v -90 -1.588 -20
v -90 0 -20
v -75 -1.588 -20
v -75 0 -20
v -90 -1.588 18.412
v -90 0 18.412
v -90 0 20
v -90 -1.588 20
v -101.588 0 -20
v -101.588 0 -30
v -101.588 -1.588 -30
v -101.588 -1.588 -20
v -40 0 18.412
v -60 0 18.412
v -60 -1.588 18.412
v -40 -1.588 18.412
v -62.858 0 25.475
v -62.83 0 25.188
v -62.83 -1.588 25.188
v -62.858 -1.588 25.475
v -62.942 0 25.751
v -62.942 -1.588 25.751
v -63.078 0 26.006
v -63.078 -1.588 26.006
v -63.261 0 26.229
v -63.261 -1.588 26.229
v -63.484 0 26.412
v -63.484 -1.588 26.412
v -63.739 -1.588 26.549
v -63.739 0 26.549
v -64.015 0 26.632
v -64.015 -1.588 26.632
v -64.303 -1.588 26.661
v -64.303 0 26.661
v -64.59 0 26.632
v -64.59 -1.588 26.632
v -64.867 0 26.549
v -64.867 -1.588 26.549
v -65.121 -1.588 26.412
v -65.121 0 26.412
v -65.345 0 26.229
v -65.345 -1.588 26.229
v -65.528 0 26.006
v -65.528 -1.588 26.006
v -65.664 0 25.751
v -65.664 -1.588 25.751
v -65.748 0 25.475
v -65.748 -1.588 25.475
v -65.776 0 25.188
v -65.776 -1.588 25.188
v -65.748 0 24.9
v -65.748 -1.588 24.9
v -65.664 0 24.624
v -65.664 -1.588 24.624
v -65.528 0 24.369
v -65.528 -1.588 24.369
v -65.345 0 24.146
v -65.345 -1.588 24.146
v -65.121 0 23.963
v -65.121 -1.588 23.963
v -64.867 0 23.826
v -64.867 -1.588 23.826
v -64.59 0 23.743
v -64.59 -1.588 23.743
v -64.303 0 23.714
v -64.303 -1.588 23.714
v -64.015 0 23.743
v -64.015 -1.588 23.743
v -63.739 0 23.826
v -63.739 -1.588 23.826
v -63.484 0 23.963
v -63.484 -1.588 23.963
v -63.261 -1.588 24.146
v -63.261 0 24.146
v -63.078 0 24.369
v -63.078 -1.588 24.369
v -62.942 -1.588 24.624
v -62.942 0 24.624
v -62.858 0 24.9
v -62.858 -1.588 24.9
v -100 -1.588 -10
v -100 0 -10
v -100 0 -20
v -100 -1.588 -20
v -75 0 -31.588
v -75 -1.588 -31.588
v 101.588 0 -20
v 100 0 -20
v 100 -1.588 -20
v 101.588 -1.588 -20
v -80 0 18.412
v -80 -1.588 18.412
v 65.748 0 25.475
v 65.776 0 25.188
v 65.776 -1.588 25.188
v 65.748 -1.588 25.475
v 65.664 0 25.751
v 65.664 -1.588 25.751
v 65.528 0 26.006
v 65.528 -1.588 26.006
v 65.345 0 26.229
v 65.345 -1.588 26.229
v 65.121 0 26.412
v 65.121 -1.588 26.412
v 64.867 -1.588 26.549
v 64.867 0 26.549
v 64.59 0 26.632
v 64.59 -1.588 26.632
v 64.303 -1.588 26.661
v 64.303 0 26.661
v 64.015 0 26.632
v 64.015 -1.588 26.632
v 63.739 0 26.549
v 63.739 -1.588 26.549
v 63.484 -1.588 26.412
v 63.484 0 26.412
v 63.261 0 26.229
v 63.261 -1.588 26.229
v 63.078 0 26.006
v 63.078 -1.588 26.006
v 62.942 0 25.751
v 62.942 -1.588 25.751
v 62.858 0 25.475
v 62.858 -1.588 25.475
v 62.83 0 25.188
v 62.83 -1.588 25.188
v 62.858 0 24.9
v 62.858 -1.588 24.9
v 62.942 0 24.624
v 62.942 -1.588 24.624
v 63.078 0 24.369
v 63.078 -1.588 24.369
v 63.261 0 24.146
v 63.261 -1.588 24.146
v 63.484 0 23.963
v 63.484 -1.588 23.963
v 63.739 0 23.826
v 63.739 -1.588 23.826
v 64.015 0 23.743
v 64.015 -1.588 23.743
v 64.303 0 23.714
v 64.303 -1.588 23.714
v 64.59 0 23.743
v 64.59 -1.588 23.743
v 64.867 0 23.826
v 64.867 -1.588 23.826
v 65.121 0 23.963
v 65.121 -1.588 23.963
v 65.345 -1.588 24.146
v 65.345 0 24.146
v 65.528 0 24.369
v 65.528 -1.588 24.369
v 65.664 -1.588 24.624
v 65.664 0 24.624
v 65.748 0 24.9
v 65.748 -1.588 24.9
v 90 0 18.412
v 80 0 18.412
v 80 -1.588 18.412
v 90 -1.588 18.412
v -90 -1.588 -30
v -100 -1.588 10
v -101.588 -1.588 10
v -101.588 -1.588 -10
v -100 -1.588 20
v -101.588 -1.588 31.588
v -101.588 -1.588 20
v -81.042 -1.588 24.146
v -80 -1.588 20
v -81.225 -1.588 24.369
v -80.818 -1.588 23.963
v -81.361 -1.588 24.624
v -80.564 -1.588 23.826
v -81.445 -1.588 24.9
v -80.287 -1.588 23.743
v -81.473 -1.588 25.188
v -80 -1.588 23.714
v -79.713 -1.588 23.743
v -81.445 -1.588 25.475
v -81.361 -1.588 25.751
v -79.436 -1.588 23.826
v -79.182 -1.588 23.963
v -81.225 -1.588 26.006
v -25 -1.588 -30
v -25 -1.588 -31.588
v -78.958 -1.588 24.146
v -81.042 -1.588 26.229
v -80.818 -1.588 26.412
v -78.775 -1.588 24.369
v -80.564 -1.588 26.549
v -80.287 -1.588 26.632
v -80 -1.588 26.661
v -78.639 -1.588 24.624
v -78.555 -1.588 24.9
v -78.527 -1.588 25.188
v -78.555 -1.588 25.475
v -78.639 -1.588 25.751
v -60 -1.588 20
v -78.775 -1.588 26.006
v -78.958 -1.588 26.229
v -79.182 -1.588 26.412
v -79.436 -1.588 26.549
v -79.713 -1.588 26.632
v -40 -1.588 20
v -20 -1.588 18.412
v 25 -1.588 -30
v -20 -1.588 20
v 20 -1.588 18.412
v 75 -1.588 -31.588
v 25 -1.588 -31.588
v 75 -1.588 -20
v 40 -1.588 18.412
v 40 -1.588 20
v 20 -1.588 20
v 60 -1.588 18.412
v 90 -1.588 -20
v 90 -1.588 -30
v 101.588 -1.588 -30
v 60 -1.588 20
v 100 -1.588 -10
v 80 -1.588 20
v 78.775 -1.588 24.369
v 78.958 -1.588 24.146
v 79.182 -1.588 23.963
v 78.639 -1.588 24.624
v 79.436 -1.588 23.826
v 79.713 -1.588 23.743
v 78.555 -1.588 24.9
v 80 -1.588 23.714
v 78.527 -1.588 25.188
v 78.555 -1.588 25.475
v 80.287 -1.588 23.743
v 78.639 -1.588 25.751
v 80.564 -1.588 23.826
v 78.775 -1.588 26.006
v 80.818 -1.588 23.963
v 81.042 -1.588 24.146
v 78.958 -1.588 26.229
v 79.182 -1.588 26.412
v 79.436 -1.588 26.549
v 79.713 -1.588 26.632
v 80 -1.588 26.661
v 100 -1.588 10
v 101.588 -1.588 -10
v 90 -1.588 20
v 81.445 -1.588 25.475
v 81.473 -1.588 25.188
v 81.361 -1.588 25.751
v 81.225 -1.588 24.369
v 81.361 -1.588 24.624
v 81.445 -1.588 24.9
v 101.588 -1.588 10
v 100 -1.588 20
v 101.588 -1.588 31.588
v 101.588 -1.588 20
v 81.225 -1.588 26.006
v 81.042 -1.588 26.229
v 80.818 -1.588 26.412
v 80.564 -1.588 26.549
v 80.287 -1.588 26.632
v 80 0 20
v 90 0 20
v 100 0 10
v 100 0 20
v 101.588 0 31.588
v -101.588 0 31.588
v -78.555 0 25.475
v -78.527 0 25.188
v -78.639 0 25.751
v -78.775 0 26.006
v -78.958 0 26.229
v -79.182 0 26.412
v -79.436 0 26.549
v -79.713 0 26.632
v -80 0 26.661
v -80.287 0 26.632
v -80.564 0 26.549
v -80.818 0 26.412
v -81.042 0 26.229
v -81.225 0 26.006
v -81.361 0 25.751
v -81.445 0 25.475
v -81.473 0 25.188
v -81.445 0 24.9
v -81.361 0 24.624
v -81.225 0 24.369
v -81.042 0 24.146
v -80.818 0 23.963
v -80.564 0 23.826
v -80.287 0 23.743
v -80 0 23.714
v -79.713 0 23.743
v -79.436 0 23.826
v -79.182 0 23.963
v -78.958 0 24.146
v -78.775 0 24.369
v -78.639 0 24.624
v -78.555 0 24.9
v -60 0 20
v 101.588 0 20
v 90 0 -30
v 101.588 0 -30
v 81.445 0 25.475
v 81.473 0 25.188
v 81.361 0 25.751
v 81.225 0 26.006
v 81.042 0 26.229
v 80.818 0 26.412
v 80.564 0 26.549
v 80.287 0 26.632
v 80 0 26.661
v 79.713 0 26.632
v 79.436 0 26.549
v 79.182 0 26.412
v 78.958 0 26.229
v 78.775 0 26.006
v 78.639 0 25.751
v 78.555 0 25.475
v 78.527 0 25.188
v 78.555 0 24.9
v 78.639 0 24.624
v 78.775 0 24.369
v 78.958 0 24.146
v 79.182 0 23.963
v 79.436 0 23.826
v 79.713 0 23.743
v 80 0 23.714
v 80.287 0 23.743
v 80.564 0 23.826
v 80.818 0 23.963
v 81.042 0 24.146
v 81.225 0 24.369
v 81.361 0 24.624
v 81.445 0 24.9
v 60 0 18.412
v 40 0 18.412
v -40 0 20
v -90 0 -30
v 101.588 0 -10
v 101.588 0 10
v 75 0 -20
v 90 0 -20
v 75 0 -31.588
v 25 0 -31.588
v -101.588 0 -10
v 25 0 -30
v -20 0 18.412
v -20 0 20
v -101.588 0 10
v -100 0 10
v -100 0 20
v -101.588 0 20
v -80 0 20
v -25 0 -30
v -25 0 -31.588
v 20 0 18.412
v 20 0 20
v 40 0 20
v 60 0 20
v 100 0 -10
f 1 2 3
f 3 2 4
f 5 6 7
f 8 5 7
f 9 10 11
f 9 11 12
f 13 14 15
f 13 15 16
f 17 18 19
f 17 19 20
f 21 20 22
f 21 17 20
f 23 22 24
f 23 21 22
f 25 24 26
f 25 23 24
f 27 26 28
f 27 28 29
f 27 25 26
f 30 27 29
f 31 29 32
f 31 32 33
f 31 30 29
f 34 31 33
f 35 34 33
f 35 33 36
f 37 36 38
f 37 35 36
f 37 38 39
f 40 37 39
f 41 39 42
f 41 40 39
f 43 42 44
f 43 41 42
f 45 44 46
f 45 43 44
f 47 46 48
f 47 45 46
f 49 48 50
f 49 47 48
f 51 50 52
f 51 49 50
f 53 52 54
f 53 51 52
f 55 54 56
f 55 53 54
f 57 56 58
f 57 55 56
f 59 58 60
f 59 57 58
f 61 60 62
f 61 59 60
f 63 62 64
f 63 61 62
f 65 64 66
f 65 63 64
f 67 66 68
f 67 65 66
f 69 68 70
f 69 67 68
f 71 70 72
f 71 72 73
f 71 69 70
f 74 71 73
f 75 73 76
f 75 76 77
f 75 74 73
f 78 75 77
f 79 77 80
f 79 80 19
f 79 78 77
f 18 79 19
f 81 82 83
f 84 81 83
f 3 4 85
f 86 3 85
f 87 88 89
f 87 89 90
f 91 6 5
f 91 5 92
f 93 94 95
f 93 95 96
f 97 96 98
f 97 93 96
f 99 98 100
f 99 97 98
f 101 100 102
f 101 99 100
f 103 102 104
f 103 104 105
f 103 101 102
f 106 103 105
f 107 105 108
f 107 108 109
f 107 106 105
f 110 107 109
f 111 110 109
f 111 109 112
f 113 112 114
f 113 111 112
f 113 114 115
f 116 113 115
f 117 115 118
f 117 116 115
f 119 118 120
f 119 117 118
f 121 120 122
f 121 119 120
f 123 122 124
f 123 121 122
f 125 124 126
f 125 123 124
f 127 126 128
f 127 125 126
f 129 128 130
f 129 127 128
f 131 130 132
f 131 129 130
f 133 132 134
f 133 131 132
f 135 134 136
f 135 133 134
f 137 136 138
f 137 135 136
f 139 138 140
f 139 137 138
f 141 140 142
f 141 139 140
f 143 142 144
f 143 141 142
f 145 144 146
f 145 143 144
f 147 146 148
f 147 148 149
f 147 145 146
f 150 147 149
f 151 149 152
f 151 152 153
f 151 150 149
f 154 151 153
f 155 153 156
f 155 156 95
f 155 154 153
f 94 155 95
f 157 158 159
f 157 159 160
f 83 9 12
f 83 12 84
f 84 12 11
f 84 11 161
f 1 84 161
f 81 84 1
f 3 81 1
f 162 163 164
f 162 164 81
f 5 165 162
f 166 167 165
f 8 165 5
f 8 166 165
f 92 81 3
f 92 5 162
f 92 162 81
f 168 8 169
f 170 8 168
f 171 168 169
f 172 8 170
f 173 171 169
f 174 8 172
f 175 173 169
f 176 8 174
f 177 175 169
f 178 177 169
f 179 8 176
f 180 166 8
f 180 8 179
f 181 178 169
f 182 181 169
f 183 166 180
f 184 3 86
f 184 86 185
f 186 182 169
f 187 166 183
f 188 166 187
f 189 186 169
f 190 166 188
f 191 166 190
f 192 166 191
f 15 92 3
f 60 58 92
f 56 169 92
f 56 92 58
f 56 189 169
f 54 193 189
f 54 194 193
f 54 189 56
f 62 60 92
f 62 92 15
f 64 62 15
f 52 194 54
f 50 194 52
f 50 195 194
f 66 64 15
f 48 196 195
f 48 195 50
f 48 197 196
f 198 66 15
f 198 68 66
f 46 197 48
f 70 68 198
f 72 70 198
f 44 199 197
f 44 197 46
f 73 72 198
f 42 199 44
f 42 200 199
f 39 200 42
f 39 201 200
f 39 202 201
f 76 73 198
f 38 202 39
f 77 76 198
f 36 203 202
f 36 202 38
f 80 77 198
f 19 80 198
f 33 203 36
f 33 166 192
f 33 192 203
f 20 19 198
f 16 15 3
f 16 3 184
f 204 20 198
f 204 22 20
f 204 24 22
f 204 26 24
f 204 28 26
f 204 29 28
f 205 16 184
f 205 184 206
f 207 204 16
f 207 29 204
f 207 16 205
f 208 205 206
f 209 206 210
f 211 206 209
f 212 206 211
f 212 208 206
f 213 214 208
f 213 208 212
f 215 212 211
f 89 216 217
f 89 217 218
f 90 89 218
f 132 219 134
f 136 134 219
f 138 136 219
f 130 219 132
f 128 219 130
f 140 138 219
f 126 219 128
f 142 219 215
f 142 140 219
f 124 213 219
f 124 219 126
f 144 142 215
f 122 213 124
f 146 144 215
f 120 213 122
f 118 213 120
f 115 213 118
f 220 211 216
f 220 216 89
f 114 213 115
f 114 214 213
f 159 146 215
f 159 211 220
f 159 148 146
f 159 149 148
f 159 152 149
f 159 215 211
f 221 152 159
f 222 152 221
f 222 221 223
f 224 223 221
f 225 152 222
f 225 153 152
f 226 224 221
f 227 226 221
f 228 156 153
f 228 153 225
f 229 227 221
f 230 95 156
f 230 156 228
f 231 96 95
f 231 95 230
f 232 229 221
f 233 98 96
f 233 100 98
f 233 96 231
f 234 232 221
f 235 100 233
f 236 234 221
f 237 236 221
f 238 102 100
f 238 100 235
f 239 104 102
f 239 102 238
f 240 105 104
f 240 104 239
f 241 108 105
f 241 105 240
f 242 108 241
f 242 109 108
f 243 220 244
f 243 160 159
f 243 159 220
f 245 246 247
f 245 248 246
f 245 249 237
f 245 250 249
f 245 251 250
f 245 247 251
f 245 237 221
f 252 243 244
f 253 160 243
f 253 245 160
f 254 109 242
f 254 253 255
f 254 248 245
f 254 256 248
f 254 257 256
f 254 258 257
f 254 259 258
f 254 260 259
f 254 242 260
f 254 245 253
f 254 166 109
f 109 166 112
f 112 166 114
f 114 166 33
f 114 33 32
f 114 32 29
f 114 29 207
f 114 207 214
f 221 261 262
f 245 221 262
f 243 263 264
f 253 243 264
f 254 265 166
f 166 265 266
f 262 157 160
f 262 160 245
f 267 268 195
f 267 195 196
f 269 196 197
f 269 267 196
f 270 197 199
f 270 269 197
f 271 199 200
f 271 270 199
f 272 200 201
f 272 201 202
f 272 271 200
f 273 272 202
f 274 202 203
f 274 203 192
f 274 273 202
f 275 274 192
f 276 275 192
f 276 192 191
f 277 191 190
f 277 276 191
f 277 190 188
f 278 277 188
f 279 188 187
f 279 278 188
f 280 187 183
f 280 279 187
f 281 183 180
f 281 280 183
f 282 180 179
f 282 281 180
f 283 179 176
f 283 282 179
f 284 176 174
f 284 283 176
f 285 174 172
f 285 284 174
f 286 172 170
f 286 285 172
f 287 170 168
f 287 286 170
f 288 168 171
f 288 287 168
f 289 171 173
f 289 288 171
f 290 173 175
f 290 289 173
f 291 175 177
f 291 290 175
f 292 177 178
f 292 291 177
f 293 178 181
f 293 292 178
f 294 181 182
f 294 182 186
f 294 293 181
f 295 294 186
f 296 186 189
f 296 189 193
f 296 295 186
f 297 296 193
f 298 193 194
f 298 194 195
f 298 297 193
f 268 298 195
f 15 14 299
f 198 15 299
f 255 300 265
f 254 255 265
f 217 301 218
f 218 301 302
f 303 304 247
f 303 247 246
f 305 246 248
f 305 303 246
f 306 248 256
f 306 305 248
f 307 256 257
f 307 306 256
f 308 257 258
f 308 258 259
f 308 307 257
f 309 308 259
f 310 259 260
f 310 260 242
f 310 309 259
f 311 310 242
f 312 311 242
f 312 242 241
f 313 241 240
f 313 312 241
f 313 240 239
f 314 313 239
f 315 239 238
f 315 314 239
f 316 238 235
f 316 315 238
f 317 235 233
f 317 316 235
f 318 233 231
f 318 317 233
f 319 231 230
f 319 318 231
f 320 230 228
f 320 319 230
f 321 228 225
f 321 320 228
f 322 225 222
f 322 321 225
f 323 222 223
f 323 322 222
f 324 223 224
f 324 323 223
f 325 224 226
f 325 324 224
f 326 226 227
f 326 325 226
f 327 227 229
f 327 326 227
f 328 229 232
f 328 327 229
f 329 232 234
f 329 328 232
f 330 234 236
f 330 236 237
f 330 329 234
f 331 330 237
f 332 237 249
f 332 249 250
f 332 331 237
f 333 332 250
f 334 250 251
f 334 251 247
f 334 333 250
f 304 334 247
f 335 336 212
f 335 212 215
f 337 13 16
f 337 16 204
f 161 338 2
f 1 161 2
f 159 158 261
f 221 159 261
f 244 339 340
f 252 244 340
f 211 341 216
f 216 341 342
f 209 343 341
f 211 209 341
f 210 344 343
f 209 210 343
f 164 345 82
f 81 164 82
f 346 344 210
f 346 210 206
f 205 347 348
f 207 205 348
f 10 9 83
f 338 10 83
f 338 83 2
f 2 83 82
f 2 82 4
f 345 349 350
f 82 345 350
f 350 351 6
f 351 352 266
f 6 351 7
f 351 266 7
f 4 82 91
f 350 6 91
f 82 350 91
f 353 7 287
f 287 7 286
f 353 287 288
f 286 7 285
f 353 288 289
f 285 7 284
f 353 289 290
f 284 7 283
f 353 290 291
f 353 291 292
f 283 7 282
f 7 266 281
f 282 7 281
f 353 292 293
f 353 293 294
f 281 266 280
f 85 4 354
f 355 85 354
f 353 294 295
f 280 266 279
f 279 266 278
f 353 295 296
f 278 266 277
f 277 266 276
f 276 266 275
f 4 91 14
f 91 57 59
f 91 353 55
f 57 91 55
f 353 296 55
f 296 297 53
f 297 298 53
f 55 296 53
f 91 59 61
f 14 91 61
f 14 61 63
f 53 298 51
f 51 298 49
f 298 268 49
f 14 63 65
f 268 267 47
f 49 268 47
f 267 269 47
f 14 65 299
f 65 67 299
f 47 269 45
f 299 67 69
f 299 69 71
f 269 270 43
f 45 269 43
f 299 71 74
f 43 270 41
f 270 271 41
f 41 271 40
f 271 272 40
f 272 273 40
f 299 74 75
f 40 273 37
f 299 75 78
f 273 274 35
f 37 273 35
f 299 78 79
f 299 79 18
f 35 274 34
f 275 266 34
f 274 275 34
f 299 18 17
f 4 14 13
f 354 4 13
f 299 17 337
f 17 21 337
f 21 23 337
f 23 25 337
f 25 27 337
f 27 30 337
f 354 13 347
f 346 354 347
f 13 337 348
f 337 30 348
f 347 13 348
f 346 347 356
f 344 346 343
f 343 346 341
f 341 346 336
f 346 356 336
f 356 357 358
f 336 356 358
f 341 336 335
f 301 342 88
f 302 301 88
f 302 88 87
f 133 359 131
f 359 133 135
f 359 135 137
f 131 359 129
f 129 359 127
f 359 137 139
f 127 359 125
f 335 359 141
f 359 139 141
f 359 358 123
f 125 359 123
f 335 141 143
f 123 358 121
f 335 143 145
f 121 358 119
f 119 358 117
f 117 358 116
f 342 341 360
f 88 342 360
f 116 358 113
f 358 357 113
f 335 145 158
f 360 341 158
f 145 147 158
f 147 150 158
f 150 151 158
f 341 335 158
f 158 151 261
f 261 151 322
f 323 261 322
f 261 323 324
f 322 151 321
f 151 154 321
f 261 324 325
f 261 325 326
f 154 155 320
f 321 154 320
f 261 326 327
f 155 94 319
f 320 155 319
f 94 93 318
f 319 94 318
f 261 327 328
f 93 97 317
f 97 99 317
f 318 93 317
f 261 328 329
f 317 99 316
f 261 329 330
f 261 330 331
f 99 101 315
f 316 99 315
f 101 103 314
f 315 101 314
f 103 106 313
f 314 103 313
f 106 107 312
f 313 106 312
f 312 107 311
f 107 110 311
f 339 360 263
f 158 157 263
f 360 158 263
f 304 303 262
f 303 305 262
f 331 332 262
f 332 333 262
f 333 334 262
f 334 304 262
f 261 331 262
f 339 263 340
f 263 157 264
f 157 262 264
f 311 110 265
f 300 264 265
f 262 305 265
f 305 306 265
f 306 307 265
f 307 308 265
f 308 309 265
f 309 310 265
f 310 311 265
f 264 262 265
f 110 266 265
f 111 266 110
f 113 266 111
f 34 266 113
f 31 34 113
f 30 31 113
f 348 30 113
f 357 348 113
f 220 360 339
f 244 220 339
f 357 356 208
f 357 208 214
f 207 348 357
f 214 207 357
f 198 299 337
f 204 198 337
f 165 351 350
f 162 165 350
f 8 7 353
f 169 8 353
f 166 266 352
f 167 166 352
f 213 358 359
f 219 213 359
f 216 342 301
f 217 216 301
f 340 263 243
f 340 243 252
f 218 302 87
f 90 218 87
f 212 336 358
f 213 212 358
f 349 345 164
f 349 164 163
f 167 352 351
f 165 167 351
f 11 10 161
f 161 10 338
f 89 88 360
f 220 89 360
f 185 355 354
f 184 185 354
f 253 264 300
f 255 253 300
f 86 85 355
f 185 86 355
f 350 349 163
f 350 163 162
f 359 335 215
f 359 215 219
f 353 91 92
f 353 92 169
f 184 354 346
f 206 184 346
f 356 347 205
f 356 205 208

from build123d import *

# Parameters (mm, degrees)
F0_W     = 50
F0_H     = 1.5875
F0_W_2   = 1.5875
F0_H_2   = 20
F0_H_3   = 10
F0_W_3   = 10
F0_R     = 1.4732
F0_W_4   = 20
F0_W_5   = 40
F1_DEPTH = 1.5875


# Not quite as in the source:
# - a length typed as a fraction of an inch, garbled in the dataset ("3 / 203.2 mm" for 3/8 in), is restored


with BuildPart() as f1:
    # F0 (on Front) → F1 (new body)
    with BuildSketch(Plane.XZ):
        with Locations((50, -30.79375)):
            Rectangle(F0_W, F0_H)
        with Locations((-50, -30.79375)):
            Rectangle(F0_W, F0_H)
        with Locations((100.79375, 0)):
            Rectangle(F0_W_2, F0_H_2)
        with Locations((100.79375, -25)):
            Rectangle(F0_W_2, F0_H_3)
        with Locations((-100.79375, 0)):
            Rectangle(F0_W_2, F0_H_2)
        with Locations((-100.79375, -25)):
            Rectangle(F0_W_2, F0_H_3)
        with Locations((100.79375, 25)):
            Rectangle(F0_W_2, F0_H_3)
        with Locations((-100.79375, 25)):
            Rectangle(F0_W_2, F0_H_3)
        Polygon((-100, 30), (100, 30), (101.5875, 30), (101.5875, 31.5875), (-101.5875, 31.5875), (-101.5875, 30), align=None)
        Polygon((100, 20), (100, 30), (-100, 30), (-100, 20), (-100, 10), (-100, -10), (-100, -20), (-100, -30), (-90, -30), (-90, -20), (-75, -20), (-75, -30), (-25, -30), (25, -30), (75, -30), (75, -20), (90, -20), (90, -30), (100, -30), (100, -20), (100, -10), (100, 10), align=None)
        with Locations((-85, 19.20625)):
            Rectangle(F0_W_3, F0_H, mode=Mode.SUBTRACT)
        with Locations((-80, 25.1875)):
            Circle(F0_R, mode=Mode.SUBTRACT)
        with Locations((-64.3028, 25.1875)):
            Circle(F0_R, mode=Mode.SUBTRACT)
        with Locations((-50, 19.20625)):
            Rectangle(F0_W_4, F0_H, mode=Mode.SUBTRACT)
        with Locations((0, 19.20625)):
            Rectangle(F0_W_5, F0_H, mode=Mode.SUBTRACT)
        with Locations((50, 19.20625)):
            Rectangle(F0_W_4, F0_H, mode=Mode.SUBTRACT)
        with Locations((85, 19.20625)):
            Rectangle(F0_W_3, F0_H, mode=Mode.SUBTRACT)
        with Locations((64.3028, 25.1875)):
            Circle(F0_R, mode=Mode.SUBTRACT)
        with Locations((80, 25.1875)):
            Circle(F0_R, mode=Mode.SUBTRACT)
    extrude(amount=F1_DEPTH)


solid = f1.part
